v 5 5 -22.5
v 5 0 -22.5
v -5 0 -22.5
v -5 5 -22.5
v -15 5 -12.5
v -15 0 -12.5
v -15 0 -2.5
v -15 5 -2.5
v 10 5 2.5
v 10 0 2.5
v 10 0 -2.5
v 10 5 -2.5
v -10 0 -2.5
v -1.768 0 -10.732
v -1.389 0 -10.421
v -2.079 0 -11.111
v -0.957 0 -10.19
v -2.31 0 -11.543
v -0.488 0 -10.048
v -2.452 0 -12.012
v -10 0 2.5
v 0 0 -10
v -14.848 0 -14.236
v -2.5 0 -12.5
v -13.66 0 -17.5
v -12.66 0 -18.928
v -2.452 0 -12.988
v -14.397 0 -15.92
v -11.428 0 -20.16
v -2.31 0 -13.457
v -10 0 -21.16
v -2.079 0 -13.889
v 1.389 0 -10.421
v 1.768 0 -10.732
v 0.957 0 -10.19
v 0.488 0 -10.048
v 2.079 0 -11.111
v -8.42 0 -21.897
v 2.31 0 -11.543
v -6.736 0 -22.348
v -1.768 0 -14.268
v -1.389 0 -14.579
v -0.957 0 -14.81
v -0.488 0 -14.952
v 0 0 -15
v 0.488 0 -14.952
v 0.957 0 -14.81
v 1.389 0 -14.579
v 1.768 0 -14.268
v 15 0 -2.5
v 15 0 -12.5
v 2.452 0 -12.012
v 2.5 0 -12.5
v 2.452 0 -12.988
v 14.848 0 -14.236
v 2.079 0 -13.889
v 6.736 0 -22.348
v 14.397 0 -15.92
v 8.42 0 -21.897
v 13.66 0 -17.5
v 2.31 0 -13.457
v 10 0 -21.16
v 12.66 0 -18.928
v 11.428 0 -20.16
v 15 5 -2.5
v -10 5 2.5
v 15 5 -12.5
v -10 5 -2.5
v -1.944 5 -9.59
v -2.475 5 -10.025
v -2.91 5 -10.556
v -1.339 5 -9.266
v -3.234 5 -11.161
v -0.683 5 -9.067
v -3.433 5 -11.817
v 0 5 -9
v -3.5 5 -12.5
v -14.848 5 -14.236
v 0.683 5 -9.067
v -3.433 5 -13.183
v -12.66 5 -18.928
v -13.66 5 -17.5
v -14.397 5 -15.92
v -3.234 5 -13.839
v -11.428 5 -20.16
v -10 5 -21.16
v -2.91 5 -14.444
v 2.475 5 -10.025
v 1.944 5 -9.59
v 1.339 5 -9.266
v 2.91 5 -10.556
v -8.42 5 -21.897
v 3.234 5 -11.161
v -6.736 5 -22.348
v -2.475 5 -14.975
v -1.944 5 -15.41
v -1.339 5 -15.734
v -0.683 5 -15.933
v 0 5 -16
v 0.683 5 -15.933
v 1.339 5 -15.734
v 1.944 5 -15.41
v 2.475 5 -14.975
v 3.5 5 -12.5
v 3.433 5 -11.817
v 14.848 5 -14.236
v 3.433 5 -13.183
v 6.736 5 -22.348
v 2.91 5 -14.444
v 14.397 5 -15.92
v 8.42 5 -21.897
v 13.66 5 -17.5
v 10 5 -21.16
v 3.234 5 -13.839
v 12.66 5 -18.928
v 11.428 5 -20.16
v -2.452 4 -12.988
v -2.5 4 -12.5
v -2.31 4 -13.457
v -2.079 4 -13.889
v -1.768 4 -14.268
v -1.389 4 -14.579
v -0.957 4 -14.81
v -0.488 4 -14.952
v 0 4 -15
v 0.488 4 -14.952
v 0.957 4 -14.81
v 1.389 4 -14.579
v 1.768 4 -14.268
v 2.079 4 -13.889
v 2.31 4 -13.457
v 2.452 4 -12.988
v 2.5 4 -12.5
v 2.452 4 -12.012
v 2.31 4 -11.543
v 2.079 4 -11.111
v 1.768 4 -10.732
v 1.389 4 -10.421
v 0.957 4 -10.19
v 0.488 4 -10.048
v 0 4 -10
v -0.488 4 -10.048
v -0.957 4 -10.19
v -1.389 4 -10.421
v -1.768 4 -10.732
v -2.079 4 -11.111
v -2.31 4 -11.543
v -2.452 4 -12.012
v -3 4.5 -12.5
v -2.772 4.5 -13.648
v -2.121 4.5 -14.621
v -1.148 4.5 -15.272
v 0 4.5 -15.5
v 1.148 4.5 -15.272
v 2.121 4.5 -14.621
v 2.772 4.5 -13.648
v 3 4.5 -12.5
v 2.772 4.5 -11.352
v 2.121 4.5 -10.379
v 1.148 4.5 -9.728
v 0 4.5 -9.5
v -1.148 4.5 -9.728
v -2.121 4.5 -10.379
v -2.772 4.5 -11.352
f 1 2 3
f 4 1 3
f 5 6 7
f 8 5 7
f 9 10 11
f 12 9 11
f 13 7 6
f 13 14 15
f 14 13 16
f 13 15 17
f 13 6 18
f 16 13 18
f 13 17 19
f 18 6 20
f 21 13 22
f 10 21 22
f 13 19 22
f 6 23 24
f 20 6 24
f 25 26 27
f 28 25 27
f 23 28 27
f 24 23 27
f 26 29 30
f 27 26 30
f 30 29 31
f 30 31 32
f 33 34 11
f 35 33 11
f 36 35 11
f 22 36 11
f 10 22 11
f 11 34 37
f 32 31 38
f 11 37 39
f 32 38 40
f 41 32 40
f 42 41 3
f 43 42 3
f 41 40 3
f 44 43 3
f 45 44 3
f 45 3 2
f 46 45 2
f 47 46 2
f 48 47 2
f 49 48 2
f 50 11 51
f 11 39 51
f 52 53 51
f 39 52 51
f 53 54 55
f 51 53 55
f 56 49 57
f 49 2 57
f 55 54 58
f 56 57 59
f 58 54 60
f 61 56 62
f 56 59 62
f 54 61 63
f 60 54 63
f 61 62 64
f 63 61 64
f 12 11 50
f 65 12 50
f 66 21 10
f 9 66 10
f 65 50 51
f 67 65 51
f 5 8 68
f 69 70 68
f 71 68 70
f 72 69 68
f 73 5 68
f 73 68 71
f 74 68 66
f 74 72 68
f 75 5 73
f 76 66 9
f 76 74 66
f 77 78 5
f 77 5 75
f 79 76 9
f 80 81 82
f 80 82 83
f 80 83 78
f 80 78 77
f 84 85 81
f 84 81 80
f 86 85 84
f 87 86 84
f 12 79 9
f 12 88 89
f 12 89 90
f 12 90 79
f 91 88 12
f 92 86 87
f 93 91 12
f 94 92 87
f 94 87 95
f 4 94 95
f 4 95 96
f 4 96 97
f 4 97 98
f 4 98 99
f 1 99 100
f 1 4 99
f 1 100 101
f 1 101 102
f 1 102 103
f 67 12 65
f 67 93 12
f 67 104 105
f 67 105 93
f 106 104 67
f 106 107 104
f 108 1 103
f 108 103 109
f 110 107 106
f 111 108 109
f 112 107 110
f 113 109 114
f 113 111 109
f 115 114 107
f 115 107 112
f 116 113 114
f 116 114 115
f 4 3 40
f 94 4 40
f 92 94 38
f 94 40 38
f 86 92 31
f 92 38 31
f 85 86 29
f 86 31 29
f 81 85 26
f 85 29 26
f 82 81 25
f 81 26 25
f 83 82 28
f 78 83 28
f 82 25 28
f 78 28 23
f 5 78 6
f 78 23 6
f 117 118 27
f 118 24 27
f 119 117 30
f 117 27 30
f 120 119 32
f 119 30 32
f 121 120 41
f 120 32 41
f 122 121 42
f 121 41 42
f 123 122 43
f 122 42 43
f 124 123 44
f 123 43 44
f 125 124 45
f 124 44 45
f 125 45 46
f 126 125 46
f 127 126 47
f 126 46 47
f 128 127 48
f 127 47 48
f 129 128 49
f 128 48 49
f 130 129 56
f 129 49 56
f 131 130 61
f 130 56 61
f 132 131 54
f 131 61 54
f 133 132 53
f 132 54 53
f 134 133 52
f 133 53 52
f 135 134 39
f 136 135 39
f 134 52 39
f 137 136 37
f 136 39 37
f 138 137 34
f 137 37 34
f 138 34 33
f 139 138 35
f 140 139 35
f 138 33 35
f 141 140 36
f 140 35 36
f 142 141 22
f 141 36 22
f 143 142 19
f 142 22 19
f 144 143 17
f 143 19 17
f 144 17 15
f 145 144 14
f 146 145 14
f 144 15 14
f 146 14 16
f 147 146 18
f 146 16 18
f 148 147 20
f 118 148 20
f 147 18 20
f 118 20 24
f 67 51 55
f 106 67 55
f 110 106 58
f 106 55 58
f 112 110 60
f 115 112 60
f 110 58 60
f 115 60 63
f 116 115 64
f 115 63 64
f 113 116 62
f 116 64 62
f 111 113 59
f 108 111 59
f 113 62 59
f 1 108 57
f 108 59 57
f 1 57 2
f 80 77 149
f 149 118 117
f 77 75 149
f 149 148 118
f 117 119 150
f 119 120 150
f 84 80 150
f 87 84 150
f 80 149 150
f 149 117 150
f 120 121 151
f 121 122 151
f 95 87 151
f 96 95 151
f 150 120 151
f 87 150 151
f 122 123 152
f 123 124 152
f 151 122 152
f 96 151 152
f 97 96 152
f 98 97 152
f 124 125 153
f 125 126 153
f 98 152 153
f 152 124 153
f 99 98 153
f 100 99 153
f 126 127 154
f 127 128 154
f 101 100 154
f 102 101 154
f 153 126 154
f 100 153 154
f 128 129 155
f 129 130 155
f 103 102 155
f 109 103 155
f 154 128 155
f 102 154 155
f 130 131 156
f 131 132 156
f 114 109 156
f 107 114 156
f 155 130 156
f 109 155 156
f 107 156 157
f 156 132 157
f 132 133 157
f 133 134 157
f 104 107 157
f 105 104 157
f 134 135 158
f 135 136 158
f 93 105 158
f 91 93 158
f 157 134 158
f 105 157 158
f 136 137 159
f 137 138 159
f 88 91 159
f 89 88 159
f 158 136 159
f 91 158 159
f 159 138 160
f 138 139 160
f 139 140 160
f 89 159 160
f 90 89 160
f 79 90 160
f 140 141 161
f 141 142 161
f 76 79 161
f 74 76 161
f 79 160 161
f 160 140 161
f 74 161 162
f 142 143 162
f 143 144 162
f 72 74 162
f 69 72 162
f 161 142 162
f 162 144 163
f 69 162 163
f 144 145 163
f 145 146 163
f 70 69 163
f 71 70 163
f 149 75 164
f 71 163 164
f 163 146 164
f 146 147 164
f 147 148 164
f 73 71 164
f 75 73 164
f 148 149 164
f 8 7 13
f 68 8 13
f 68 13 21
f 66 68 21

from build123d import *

# Parameters (mm, degrees)
EXTRUDE_1_DEPTH             = 5
HOLE_WIZARD_M61_D           = 5
HOLE_WIZARD_M61_CSINK_D     = 7
HOLE_WIZARD_M61_CSINK_ANGLE = 90


with BuildPart() as part:
    # Эскиз1 → Бобышка-Вытянуть1 (new body)
    with BuildSketch(Plane(origin=(0, 0, 0), x_dir=(1, 0, 0), z_dir=(0, 1, 0))):
        with BuildLine():
            Line((-15, 2.5), (-10, 2.5))
            Line((-10, 2.5), (-10, -2.5))
            Line((-10, -2.5), (10, -2.5))
            Line((10, -2.5), (10, 2.5))
            Line((10, 2.5), (15, 2.5))
            Line((15, 2.5), (15, 12.5))
            ThreePointArc((15, 12.5), (12.071067812, 19.571067812), (5, 22.5))
            Line((5, 22.5), (-5, 22.5))
            ThreePointArc((-5, 22.5), (-12.071067812, 19.571067812), (-15, 12.5))
            Line((-15, 12.5), (-15, 2.5))
        make_face()
    extrude(amount=EXTRUDE_1_DEPTH)

    # Отверстие обработанное метчиком M61 (through all)
    with Locations(Plane(origin=(0, 5, 0), x_dir=(1, 0, 0), z_dir=(0, 1, 0))):
        with Locations((0, 12.5)):
            CounterSinkHole(HOLE_WIZARD_M61_D / 2, HOLE_WIZARD_M61_CSINK_D / 2, counter_sink_angle=HOLE_WIZARD_M61_CSINK_ANGLE)


solid = part.part
